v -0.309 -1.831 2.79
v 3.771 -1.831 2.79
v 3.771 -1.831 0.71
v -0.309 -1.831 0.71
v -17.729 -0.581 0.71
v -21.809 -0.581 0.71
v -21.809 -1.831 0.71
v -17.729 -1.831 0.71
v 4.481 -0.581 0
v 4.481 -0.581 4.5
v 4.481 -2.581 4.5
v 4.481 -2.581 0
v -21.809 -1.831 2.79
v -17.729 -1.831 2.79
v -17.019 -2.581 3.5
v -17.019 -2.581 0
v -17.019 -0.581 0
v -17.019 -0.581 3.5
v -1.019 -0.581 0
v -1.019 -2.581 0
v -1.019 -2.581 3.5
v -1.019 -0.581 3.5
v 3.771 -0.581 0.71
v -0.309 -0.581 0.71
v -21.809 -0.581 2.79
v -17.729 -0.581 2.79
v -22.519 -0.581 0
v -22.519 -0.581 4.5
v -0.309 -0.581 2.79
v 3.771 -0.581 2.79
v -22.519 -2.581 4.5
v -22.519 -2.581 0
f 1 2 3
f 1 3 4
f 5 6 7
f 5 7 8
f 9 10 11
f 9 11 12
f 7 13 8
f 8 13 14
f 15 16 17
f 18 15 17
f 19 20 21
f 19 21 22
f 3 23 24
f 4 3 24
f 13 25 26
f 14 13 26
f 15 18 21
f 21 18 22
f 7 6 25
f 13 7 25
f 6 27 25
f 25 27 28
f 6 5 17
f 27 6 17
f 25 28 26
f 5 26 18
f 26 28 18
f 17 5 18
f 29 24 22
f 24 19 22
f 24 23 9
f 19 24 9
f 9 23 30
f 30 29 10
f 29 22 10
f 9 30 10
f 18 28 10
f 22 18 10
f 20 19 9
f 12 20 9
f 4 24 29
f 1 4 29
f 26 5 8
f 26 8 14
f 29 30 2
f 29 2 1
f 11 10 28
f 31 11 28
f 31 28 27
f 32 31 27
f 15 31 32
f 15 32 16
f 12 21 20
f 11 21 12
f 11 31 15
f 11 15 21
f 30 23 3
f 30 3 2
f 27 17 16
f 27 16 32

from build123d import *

# Parameters (mm, degrees)
F0_W     = 5.5
F0_H     = 2
F1_DEPTH = 3.5
F2_W     = 4.080000014
F2_H     = 2.080000014
F3_DEPTH = 1.25
F5_DEPTH = 2


with BuildPart() as f1:
    # F0 (on Top) → F1 (new body)
    with BuildSketch(Plane.XY):
        with Locations((1.7311600968, -1.5813936108)):
            Rectangle(F0_W, F0_H)
    extrude(amount=F1_DEPTH)

    # F2 (on face) → F3 (cut, through all)
    with BuildSketch(Plane(origin=(0, -0.5813936108, 0), x_dir=(-1, 0, 0), z_dir=(0, 1, 0))):
        with Locations((-1.7311600968, 1.75)):
            Rectangle(F2_W, F2_H)
    extrude(amount=-F3_DEPTH, mode=Mode.SUBTRACT)

    # F4 (on face) → F5 (join, through all)
    with BuildSketch(Plane(origin=(0, -0.5813936108, 0), x_dir=(-1, 0, 0), z_dir=(0, 1, 0))):
        Polygon((-4.4811600968, 4.5), (-4.4811600968, 3.5), (1.0188399032, 3.5), (9.0188399032, 3.5), (9.0188399032, 4.5), align=None)
    extrude(amount=-F5_DEPTH)

    # F6: F1 across face


with BuildPart() as f1_1:
    add(f1.part)
    add(f1.part.mirror(Plane(origin=(-9.0188399032, -1.5813936108, 4), x_dir=(0, -1, 0), z_dir=(-1, 0, 0))))


solid = f1_1.part
